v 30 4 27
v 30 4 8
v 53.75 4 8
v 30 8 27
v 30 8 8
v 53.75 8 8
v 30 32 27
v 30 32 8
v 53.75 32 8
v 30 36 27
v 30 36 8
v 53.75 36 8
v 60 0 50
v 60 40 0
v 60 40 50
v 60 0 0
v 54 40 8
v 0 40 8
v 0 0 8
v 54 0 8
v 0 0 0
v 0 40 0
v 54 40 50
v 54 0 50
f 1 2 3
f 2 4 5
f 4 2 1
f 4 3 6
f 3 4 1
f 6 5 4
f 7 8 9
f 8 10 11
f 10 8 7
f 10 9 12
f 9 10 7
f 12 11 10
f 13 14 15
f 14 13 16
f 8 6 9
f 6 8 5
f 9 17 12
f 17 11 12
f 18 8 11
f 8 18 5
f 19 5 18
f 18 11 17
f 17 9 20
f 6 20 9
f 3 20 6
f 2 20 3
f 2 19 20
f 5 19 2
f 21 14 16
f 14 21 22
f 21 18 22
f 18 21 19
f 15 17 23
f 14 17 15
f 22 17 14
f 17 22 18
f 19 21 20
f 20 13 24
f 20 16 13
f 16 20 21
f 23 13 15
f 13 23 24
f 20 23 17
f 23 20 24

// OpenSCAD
$fn = 32;

// ----------------------------------------------------------------------
// Rib bracket: 2-gusset L bracket
// ----------------------------------------------------------------------

// --- parameters (mm) ---
base_l = 60;              // foot length, X
base_w = 40;              // foot width, Y
base_t = 8;               // foot thickness
plate_t = 6;              // upright plate thickness
plate_h = 50;             // overall height
gus_l = 24;               // gusset leg along the foot
gus_h = 20;               // gusset height
gus_t = 4;                // gusset thickness
gus_edge = 4;             // gusset margin from the foot edge
n_gus = 2;                // gusset count

gus_pitch = (base_w - 2 * gus_edge - gus_t) / (n_gus - 1);  // gusset pitch

union() {
  cube([base_l, base_w, base_t]);
  translate([base_l - plate_t, 0, base_t - 1])
    cube([plate_t, base_w, plate_h - base_t + 1]);
  for (i = [0 : n_gus - 1])
    translate([base_l - plate_t - gus_l, gus_edge + i * gus_pitch, base_t - 1])
      rotate([-90, 0, 0])
        linear_extrude(height = gus_t)
          polygon(points = [[0, 0], [gus_l + 1, 0], [0, -gus_h]]);
}
